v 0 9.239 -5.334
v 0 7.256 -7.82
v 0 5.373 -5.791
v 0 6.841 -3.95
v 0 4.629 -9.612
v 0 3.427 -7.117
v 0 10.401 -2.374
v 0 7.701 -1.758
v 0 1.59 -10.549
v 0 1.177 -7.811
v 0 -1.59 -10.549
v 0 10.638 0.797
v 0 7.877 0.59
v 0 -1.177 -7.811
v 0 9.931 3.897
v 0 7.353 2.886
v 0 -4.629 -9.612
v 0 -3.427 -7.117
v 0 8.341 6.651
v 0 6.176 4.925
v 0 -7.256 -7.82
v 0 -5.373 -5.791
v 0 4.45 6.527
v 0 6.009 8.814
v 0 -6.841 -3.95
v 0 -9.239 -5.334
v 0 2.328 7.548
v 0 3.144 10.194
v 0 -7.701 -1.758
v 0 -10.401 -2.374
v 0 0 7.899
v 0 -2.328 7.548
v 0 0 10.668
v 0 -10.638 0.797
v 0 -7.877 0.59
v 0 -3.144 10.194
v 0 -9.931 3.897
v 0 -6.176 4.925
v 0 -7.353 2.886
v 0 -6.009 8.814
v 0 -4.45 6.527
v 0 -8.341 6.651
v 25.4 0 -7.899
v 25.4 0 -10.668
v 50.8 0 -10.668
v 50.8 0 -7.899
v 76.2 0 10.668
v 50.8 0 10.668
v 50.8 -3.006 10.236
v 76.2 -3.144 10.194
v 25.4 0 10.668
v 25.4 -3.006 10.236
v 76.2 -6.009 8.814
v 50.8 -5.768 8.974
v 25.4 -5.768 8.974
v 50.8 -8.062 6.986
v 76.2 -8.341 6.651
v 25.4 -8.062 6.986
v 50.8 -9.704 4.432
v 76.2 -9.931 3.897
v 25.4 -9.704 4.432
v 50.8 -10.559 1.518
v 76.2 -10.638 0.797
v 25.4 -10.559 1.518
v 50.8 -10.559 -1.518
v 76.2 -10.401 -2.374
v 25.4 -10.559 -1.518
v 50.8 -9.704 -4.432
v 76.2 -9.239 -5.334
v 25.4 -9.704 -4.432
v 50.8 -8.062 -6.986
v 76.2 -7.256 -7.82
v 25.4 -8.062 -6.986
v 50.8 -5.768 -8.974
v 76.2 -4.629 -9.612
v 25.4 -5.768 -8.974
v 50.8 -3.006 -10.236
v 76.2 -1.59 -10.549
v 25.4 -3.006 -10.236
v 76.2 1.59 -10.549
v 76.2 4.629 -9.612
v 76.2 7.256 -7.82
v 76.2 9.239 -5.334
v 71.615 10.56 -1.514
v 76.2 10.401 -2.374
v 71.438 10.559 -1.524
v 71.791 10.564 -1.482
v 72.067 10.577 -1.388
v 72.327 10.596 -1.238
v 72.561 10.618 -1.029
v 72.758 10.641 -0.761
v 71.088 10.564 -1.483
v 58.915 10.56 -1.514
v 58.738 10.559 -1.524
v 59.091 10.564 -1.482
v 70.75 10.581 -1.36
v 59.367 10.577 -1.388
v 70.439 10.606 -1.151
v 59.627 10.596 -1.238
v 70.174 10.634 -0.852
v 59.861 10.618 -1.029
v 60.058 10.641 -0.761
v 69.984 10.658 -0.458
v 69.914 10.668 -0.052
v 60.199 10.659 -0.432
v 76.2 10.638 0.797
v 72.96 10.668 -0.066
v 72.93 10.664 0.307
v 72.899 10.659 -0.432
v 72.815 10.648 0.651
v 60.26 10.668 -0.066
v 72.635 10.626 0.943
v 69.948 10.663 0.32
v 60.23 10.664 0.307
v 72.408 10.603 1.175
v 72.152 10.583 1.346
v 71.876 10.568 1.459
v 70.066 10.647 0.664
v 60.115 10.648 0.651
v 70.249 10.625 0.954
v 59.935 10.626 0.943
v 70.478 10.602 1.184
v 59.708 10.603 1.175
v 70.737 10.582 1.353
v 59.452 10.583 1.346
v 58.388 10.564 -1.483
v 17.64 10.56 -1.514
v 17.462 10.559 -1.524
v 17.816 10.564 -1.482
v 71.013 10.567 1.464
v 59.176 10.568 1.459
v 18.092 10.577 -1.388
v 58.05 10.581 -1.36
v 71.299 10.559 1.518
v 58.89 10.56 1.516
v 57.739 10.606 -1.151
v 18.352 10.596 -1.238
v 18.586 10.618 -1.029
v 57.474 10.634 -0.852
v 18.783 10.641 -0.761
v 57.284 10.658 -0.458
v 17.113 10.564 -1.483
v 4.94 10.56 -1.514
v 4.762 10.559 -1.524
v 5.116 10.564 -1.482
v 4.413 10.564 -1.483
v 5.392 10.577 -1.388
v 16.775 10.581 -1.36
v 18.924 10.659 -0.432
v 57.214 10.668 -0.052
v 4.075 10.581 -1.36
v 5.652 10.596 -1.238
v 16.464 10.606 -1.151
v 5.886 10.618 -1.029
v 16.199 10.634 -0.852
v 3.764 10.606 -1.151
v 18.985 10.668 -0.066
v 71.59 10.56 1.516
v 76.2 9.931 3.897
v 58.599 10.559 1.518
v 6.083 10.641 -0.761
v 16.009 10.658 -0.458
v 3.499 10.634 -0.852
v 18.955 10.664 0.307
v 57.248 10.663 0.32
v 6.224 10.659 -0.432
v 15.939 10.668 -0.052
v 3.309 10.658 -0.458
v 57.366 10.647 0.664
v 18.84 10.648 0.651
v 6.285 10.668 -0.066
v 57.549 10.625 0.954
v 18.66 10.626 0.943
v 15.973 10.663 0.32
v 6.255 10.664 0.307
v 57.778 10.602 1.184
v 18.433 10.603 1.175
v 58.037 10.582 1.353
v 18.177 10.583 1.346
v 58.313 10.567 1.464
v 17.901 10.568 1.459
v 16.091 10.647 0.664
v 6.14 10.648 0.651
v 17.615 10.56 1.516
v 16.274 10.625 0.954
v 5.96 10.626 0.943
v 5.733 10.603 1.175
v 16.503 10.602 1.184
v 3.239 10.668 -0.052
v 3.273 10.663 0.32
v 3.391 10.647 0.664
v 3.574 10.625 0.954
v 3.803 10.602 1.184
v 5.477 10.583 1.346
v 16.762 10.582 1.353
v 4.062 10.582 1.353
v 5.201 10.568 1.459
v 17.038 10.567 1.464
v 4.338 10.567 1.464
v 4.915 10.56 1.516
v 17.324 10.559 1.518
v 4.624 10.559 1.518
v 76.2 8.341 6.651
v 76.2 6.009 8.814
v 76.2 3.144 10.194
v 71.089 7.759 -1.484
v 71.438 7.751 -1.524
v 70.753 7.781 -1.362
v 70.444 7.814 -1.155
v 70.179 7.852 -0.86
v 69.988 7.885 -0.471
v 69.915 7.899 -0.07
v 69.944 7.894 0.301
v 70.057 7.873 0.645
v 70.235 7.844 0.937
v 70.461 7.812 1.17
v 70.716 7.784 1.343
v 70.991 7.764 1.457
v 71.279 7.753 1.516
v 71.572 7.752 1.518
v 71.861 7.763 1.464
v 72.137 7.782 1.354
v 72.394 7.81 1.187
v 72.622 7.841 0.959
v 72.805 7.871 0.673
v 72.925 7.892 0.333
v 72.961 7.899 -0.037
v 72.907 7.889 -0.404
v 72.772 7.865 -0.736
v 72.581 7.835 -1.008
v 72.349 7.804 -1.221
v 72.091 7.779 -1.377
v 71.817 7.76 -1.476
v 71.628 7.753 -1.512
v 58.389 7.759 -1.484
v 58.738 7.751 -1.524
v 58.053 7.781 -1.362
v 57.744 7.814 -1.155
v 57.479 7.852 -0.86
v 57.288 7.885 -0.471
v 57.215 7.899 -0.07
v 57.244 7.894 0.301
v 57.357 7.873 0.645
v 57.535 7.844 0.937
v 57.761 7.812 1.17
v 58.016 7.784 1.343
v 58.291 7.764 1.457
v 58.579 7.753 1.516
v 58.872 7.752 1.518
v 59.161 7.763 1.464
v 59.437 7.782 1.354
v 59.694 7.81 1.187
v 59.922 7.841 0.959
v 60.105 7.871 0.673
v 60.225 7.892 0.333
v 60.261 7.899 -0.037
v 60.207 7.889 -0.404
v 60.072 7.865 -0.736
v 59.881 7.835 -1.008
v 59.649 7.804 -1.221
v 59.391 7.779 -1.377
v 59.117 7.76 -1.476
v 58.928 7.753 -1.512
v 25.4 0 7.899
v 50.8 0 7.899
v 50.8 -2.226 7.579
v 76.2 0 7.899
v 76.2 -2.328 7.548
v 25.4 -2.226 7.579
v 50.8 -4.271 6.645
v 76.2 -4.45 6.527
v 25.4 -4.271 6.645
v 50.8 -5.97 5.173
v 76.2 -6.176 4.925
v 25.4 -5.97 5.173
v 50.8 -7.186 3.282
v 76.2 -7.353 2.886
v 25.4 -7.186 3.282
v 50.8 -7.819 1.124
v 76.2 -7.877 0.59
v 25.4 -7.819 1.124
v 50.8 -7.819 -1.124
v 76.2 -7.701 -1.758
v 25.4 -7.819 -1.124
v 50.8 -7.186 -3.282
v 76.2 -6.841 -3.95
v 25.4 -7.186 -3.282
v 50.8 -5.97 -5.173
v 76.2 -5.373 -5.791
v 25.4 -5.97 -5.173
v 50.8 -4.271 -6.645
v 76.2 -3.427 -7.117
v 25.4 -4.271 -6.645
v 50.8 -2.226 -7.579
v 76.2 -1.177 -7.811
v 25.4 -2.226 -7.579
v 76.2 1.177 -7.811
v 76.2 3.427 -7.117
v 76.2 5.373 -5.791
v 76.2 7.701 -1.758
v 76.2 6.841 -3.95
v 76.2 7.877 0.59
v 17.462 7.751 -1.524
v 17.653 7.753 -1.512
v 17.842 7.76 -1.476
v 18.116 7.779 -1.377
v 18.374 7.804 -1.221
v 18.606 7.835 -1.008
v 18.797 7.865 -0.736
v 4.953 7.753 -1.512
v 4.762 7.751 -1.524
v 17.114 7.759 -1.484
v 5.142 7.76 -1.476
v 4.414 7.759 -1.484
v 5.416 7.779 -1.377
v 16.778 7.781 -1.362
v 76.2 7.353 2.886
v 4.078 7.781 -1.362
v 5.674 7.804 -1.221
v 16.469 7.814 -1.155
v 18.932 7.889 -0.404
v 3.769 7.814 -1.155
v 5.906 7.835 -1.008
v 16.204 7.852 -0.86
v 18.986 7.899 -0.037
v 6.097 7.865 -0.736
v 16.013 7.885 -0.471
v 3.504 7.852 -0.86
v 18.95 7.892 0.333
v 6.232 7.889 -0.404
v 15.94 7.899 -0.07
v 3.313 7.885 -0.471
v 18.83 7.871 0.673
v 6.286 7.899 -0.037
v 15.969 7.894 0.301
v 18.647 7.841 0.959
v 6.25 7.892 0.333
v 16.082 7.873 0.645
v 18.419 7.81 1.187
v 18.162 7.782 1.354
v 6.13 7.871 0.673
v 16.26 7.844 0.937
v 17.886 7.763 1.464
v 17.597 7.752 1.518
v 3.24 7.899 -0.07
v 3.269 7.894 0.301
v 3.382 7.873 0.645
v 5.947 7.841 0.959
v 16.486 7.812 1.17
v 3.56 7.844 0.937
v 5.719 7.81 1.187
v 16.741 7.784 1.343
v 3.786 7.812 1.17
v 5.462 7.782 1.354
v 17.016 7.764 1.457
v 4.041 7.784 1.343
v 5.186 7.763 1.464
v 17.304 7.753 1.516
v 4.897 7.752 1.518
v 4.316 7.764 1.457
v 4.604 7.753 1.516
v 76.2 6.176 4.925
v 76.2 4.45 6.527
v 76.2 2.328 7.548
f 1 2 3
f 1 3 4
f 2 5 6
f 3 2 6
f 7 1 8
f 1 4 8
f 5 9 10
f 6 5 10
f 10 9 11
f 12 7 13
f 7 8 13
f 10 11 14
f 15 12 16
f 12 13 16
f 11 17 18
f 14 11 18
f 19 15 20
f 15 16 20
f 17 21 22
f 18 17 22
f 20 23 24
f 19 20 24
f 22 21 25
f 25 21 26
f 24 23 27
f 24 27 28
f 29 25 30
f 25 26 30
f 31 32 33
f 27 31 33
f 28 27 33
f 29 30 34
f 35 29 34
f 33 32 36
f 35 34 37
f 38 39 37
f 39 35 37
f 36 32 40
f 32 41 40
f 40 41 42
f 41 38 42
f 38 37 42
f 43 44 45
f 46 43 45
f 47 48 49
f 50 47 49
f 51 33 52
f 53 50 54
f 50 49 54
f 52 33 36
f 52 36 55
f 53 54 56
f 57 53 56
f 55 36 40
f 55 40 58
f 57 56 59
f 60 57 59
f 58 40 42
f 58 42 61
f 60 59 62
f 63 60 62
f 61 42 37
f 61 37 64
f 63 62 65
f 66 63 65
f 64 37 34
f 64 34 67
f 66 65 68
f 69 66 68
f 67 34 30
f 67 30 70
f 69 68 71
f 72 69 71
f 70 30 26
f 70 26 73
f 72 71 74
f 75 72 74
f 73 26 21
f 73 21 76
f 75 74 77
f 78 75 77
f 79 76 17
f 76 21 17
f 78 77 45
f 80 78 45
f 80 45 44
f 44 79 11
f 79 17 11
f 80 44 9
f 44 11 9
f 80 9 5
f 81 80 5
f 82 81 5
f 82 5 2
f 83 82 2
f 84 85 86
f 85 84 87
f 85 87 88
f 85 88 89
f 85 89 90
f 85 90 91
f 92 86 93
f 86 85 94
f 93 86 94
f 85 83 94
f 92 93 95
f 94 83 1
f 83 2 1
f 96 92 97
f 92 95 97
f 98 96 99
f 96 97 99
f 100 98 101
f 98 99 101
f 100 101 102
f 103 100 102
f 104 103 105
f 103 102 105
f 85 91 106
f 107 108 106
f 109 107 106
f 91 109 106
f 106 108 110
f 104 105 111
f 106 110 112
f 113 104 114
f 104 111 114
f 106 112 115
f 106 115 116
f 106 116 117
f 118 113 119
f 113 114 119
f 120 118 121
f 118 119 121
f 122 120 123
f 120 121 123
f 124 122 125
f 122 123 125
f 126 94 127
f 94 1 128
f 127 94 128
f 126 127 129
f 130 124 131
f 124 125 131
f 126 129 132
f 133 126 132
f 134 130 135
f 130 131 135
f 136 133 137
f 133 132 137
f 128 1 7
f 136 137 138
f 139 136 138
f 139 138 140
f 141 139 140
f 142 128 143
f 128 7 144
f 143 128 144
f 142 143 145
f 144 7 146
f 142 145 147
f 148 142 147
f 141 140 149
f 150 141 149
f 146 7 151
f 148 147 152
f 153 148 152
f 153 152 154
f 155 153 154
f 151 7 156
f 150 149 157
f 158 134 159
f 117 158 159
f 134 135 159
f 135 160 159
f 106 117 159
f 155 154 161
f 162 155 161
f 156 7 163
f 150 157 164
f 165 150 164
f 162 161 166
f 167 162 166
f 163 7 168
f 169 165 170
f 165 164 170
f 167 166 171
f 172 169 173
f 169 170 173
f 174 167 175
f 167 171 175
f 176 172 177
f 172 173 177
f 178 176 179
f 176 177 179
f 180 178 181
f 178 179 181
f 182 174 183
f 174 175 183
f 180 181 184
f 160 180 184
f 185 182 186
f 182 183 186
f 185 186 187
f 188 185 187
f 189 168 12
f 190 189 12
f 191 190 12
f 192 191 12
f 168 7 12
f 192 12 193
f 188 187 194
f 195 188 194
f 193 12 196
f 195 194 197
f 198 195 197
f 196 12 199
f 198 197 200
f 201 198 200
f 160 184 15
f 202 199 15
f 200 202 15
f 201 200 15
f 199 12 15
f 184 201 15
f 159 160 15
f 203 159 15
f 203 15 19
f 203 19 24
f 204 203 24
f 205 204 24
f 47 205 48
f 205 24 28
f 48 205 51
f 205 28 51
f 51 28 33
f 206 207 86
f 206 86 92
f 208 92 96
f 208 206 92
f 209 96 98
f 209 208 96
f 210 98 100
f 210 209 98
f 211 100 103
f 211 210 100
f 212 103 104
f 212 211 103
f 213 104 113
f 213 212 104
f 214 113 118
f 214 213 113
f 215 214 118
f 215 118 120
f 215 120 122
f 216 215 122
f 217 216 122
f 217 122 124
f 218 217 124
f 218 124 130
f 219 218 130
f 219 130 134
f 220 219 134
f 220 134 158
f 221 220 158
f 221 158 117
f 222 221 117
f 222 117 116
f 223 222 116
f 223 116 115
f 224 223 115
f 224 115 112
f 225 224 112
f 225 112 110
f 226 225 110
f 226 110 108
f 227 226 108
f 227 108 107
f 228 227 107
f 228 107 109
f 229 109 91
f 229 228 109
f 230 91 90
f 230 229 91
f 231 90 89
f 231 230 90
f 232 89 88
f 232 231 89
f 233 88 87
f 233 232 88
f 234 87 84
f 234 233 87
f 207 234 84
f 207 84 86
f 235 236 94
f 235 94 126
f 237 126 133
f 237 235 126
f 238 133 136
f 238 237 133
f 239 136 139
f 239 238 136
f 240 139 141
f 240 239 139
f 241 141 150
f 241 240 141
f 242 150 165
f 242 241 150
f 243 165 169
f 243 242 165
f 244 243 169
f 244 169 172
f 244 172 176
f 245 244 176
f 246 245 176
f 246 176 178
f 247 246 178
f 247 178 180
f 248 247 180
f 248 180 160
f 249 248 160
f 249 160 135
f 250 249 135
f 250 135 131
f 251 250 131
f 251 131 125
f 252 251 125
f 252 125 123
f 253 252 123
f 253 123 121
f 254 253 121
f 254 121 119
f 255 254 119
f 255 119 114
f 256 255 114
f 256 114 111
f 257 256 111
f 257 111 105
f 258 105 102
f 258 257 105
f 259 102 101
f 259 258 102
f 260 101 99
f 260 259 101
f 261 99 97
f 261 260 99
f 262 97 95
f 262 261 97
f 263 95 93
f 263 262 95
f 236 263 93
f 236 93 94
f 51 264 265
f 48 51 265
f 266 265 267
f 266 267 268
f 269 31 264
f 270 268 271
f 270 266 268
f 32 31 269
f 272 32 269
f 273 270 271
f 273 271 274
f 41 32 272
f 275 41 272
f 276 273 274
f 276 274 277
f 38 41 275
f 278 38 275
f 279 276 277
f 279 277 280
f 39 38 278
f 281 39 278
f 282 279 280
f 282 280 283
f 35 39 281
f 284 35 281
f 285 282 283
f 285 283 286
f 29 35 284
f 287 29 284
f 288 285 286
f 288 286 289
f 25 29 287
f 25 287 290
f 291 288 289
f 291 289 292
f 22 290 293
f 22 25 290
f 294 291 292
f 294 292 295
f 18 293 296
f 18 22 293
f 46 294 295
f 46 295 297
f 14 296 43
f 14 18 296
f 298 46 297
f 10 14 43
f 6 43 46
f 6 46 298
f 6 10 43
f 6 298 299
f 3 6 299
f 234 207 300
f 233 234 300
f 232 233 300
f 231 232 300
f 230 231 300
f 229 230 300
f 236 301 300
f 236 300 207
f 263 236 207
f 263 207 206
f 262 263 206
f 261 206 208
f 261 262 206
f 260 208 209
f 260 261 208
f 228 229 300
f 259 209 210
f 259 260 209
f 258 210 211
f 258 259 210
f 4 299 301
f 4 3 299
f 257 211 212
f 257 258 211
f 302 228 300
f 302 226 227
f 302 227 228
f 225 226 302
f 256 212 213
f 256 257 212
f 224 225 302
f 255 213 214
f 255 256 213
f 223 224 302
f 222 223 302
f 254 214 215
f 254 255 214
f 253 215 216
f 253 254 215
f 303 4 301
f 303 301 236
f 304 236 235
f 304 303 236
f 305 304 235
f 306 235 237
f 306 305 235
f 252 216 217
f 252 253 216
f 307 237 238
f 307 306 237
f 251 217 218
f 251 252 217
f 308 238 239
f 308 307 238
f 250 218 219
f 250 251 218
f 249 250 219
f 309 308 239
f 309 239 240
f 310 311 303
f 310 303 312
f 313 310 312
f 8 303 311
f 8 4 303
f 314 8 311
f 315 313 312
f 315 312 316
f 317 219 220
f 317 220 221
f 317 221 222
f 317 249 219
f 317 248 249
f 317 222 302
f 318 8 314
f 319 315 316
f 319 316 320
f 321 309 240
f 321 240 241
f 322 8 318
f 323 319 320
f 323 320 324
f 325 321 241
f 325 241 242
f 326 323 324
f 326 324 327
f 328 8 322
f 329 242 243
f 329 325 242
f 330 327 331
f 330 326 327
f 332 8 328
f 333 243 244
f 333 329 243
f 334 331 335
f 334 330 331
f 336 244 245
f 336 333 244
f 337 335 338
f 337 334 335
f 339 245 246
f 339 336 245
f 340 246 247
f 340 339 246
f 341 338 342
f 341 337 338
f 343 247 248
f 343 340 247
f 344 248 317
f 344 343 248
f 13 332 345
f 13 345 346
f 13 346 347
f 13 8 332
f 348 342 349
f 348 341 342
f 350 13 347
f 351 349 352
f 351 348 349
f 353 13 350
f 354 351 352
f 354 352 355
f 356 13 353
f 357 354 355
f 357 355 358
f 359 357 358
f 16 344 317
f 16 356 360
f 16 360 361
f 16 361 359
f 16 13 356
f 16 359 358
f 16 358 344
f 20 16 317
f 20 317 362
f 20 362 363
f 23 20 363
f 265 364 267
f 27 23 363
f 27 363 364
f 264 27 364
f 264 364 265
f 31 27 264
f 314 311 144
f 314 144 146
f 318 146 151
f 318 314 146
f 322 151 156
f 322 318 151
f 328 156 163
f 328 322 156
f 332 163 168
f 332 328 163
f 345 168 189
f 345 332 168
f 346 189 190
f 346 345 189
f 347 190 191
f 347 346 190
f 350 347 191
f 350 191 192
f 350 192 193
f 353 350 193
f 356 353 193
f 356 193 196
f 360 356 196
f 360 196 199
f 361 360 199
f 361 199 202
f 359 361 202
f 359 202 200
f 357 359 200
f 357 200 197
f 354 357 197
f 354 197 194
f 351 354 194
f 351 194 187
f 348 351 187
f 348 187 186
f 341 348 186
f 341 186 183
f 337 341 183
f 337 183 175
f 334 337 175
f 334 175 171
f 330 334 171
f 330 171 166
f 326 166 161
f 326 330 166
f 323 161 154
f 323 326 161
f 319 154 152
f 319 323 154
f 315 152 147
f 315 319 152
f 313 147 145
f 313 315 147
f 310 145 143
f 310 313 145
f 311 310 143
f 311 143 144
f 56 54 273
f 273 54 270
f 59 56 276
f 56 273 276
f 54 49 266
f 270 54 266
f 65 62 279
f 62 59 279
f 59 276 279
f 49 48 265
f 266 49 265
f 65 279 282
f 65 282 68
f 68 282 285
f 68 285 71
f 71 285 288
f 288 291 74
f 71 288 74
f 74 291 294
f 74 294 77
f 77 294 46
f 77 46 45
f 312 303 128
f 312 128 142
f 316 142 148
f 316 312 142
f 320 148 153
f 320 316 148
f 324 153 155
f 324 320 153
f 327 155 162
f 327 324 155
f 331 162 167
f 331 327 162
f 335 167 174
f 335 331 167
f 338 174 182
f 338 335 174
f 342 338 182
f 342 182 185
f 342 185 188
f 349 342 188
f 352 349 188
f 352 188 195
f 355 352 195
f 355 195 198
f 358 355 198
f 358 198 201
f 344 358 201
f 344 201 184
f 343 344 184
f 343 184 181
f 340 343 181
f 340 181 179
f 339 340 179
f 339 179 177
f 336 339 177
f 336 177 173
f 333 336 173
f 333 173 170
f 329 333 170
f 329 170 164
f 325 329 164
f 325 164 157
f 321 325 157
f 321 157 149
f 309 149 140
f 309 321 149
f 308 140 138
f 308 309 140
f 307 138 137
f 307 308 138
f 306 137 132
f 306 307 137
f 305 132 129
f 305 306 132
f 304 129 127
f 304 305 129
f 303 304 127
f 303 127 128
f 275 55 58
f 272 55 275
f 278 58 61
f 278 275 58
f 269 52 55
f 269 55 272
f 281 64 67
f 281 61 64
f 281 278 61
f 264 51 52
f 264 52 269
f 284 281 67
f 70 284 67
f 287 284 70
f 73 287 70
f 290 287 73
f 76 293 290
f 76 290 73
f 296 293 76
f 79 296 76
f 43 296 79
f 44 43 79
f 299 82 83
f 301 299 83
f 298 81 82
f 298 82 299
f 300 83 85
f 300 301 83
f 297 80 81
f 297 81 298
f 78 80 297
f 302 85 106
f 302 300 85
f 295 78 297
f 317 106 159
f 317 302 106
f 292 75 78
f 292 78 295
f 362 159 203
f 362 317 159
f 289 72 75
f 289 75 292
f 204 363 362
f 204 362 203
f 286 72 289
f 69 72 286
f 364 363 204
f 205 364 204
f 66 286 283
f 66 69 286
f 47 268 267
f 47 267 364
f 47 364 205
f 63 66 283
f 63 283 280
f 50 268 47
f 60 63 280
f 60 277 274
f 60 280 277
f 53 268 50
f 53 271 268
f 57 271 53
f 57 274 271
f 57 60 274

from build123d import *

# Parameters (mm, degrees)
SKETCH1_R               = 10.668
SKETCH1_R_2             = 7.8994
MAINBODY_DEPTH          = 76.2
COAXENTRY_REACH         = 79.679
SKETCH2_W               = 25.4
SKETCH2_H               = 25.4
SKETCH3_R               = 1.524
ANTENNAMOUNTHOLES_DEPTH = 78.679163538


with BuildPart() as part:
    # Sketch1 → MainBody (new body)
    with BuildSketch(Plane(origin=(0, 0, 0), x_dir=(0, 0, -1), z_dir=(1, 0, 0))):
        with Locations(Location((0, 0, 0), (0, 0, 180))):
            Circle(SKETCH1_R)
        with Locations(Location((0, 0, 0), (0, 0, 180))):
            Circle(SKETCH1_R_2, mode=Mode.SUBTRACT)
    extrude(amount=MAINBODY_DEPTH)

    # Sketch2 → CoaxEntry (cut, up to next)
    with BuildSketch(Plane(origin=(0, 0, 0), x_dir=(1, 0, 0), z_dir=(0, 1, 0)), mode=Mode.PRIVATE) as coaxentry_sk1:
        with Locations((38.1, 0)):
            Rectangle(SKETCH2_W, SKETCH2_H)
    coaxentry_tool1 = extrude(coaxentry_sk1.sketch, amount=-COAXENTRY_REACH, mode=Mode.PRIVATE) & part.part
    add(coaxentry_tool1.solids().sort_by_distance((38.1, 0, 0))[0], mode=Mode.SUBTRACT)

    # Sketch3 → AntennaMountHoles (cut, through all)
    with BuildSketch(Plane(origin=(0, 0, 0), x_dir=(1, 0, 0), z_dir=(0, 1, 0))):
        with Locations(Location((4.7625, 0, 0), (0, 0, 90))):
            Circle(SKETCH3_R)
        with Locations(Location((17.4625, 0, 0), (0, 0, 90))):
            Circle(SKETCH3_R)
        with Locations(Location((71.4375, 0, 0), (0, 0, 90))):
            Circle(SKETCH3_R)
        with Locations(Location((58.7375, 0, 0), (0, 0, 90))):
            Circle(SKETCH3_R)
    extrude(amount=ANTENNAMOUNTHOLES_DEPTH, mode=Mode.SUBTRACT)


solid = part.part
